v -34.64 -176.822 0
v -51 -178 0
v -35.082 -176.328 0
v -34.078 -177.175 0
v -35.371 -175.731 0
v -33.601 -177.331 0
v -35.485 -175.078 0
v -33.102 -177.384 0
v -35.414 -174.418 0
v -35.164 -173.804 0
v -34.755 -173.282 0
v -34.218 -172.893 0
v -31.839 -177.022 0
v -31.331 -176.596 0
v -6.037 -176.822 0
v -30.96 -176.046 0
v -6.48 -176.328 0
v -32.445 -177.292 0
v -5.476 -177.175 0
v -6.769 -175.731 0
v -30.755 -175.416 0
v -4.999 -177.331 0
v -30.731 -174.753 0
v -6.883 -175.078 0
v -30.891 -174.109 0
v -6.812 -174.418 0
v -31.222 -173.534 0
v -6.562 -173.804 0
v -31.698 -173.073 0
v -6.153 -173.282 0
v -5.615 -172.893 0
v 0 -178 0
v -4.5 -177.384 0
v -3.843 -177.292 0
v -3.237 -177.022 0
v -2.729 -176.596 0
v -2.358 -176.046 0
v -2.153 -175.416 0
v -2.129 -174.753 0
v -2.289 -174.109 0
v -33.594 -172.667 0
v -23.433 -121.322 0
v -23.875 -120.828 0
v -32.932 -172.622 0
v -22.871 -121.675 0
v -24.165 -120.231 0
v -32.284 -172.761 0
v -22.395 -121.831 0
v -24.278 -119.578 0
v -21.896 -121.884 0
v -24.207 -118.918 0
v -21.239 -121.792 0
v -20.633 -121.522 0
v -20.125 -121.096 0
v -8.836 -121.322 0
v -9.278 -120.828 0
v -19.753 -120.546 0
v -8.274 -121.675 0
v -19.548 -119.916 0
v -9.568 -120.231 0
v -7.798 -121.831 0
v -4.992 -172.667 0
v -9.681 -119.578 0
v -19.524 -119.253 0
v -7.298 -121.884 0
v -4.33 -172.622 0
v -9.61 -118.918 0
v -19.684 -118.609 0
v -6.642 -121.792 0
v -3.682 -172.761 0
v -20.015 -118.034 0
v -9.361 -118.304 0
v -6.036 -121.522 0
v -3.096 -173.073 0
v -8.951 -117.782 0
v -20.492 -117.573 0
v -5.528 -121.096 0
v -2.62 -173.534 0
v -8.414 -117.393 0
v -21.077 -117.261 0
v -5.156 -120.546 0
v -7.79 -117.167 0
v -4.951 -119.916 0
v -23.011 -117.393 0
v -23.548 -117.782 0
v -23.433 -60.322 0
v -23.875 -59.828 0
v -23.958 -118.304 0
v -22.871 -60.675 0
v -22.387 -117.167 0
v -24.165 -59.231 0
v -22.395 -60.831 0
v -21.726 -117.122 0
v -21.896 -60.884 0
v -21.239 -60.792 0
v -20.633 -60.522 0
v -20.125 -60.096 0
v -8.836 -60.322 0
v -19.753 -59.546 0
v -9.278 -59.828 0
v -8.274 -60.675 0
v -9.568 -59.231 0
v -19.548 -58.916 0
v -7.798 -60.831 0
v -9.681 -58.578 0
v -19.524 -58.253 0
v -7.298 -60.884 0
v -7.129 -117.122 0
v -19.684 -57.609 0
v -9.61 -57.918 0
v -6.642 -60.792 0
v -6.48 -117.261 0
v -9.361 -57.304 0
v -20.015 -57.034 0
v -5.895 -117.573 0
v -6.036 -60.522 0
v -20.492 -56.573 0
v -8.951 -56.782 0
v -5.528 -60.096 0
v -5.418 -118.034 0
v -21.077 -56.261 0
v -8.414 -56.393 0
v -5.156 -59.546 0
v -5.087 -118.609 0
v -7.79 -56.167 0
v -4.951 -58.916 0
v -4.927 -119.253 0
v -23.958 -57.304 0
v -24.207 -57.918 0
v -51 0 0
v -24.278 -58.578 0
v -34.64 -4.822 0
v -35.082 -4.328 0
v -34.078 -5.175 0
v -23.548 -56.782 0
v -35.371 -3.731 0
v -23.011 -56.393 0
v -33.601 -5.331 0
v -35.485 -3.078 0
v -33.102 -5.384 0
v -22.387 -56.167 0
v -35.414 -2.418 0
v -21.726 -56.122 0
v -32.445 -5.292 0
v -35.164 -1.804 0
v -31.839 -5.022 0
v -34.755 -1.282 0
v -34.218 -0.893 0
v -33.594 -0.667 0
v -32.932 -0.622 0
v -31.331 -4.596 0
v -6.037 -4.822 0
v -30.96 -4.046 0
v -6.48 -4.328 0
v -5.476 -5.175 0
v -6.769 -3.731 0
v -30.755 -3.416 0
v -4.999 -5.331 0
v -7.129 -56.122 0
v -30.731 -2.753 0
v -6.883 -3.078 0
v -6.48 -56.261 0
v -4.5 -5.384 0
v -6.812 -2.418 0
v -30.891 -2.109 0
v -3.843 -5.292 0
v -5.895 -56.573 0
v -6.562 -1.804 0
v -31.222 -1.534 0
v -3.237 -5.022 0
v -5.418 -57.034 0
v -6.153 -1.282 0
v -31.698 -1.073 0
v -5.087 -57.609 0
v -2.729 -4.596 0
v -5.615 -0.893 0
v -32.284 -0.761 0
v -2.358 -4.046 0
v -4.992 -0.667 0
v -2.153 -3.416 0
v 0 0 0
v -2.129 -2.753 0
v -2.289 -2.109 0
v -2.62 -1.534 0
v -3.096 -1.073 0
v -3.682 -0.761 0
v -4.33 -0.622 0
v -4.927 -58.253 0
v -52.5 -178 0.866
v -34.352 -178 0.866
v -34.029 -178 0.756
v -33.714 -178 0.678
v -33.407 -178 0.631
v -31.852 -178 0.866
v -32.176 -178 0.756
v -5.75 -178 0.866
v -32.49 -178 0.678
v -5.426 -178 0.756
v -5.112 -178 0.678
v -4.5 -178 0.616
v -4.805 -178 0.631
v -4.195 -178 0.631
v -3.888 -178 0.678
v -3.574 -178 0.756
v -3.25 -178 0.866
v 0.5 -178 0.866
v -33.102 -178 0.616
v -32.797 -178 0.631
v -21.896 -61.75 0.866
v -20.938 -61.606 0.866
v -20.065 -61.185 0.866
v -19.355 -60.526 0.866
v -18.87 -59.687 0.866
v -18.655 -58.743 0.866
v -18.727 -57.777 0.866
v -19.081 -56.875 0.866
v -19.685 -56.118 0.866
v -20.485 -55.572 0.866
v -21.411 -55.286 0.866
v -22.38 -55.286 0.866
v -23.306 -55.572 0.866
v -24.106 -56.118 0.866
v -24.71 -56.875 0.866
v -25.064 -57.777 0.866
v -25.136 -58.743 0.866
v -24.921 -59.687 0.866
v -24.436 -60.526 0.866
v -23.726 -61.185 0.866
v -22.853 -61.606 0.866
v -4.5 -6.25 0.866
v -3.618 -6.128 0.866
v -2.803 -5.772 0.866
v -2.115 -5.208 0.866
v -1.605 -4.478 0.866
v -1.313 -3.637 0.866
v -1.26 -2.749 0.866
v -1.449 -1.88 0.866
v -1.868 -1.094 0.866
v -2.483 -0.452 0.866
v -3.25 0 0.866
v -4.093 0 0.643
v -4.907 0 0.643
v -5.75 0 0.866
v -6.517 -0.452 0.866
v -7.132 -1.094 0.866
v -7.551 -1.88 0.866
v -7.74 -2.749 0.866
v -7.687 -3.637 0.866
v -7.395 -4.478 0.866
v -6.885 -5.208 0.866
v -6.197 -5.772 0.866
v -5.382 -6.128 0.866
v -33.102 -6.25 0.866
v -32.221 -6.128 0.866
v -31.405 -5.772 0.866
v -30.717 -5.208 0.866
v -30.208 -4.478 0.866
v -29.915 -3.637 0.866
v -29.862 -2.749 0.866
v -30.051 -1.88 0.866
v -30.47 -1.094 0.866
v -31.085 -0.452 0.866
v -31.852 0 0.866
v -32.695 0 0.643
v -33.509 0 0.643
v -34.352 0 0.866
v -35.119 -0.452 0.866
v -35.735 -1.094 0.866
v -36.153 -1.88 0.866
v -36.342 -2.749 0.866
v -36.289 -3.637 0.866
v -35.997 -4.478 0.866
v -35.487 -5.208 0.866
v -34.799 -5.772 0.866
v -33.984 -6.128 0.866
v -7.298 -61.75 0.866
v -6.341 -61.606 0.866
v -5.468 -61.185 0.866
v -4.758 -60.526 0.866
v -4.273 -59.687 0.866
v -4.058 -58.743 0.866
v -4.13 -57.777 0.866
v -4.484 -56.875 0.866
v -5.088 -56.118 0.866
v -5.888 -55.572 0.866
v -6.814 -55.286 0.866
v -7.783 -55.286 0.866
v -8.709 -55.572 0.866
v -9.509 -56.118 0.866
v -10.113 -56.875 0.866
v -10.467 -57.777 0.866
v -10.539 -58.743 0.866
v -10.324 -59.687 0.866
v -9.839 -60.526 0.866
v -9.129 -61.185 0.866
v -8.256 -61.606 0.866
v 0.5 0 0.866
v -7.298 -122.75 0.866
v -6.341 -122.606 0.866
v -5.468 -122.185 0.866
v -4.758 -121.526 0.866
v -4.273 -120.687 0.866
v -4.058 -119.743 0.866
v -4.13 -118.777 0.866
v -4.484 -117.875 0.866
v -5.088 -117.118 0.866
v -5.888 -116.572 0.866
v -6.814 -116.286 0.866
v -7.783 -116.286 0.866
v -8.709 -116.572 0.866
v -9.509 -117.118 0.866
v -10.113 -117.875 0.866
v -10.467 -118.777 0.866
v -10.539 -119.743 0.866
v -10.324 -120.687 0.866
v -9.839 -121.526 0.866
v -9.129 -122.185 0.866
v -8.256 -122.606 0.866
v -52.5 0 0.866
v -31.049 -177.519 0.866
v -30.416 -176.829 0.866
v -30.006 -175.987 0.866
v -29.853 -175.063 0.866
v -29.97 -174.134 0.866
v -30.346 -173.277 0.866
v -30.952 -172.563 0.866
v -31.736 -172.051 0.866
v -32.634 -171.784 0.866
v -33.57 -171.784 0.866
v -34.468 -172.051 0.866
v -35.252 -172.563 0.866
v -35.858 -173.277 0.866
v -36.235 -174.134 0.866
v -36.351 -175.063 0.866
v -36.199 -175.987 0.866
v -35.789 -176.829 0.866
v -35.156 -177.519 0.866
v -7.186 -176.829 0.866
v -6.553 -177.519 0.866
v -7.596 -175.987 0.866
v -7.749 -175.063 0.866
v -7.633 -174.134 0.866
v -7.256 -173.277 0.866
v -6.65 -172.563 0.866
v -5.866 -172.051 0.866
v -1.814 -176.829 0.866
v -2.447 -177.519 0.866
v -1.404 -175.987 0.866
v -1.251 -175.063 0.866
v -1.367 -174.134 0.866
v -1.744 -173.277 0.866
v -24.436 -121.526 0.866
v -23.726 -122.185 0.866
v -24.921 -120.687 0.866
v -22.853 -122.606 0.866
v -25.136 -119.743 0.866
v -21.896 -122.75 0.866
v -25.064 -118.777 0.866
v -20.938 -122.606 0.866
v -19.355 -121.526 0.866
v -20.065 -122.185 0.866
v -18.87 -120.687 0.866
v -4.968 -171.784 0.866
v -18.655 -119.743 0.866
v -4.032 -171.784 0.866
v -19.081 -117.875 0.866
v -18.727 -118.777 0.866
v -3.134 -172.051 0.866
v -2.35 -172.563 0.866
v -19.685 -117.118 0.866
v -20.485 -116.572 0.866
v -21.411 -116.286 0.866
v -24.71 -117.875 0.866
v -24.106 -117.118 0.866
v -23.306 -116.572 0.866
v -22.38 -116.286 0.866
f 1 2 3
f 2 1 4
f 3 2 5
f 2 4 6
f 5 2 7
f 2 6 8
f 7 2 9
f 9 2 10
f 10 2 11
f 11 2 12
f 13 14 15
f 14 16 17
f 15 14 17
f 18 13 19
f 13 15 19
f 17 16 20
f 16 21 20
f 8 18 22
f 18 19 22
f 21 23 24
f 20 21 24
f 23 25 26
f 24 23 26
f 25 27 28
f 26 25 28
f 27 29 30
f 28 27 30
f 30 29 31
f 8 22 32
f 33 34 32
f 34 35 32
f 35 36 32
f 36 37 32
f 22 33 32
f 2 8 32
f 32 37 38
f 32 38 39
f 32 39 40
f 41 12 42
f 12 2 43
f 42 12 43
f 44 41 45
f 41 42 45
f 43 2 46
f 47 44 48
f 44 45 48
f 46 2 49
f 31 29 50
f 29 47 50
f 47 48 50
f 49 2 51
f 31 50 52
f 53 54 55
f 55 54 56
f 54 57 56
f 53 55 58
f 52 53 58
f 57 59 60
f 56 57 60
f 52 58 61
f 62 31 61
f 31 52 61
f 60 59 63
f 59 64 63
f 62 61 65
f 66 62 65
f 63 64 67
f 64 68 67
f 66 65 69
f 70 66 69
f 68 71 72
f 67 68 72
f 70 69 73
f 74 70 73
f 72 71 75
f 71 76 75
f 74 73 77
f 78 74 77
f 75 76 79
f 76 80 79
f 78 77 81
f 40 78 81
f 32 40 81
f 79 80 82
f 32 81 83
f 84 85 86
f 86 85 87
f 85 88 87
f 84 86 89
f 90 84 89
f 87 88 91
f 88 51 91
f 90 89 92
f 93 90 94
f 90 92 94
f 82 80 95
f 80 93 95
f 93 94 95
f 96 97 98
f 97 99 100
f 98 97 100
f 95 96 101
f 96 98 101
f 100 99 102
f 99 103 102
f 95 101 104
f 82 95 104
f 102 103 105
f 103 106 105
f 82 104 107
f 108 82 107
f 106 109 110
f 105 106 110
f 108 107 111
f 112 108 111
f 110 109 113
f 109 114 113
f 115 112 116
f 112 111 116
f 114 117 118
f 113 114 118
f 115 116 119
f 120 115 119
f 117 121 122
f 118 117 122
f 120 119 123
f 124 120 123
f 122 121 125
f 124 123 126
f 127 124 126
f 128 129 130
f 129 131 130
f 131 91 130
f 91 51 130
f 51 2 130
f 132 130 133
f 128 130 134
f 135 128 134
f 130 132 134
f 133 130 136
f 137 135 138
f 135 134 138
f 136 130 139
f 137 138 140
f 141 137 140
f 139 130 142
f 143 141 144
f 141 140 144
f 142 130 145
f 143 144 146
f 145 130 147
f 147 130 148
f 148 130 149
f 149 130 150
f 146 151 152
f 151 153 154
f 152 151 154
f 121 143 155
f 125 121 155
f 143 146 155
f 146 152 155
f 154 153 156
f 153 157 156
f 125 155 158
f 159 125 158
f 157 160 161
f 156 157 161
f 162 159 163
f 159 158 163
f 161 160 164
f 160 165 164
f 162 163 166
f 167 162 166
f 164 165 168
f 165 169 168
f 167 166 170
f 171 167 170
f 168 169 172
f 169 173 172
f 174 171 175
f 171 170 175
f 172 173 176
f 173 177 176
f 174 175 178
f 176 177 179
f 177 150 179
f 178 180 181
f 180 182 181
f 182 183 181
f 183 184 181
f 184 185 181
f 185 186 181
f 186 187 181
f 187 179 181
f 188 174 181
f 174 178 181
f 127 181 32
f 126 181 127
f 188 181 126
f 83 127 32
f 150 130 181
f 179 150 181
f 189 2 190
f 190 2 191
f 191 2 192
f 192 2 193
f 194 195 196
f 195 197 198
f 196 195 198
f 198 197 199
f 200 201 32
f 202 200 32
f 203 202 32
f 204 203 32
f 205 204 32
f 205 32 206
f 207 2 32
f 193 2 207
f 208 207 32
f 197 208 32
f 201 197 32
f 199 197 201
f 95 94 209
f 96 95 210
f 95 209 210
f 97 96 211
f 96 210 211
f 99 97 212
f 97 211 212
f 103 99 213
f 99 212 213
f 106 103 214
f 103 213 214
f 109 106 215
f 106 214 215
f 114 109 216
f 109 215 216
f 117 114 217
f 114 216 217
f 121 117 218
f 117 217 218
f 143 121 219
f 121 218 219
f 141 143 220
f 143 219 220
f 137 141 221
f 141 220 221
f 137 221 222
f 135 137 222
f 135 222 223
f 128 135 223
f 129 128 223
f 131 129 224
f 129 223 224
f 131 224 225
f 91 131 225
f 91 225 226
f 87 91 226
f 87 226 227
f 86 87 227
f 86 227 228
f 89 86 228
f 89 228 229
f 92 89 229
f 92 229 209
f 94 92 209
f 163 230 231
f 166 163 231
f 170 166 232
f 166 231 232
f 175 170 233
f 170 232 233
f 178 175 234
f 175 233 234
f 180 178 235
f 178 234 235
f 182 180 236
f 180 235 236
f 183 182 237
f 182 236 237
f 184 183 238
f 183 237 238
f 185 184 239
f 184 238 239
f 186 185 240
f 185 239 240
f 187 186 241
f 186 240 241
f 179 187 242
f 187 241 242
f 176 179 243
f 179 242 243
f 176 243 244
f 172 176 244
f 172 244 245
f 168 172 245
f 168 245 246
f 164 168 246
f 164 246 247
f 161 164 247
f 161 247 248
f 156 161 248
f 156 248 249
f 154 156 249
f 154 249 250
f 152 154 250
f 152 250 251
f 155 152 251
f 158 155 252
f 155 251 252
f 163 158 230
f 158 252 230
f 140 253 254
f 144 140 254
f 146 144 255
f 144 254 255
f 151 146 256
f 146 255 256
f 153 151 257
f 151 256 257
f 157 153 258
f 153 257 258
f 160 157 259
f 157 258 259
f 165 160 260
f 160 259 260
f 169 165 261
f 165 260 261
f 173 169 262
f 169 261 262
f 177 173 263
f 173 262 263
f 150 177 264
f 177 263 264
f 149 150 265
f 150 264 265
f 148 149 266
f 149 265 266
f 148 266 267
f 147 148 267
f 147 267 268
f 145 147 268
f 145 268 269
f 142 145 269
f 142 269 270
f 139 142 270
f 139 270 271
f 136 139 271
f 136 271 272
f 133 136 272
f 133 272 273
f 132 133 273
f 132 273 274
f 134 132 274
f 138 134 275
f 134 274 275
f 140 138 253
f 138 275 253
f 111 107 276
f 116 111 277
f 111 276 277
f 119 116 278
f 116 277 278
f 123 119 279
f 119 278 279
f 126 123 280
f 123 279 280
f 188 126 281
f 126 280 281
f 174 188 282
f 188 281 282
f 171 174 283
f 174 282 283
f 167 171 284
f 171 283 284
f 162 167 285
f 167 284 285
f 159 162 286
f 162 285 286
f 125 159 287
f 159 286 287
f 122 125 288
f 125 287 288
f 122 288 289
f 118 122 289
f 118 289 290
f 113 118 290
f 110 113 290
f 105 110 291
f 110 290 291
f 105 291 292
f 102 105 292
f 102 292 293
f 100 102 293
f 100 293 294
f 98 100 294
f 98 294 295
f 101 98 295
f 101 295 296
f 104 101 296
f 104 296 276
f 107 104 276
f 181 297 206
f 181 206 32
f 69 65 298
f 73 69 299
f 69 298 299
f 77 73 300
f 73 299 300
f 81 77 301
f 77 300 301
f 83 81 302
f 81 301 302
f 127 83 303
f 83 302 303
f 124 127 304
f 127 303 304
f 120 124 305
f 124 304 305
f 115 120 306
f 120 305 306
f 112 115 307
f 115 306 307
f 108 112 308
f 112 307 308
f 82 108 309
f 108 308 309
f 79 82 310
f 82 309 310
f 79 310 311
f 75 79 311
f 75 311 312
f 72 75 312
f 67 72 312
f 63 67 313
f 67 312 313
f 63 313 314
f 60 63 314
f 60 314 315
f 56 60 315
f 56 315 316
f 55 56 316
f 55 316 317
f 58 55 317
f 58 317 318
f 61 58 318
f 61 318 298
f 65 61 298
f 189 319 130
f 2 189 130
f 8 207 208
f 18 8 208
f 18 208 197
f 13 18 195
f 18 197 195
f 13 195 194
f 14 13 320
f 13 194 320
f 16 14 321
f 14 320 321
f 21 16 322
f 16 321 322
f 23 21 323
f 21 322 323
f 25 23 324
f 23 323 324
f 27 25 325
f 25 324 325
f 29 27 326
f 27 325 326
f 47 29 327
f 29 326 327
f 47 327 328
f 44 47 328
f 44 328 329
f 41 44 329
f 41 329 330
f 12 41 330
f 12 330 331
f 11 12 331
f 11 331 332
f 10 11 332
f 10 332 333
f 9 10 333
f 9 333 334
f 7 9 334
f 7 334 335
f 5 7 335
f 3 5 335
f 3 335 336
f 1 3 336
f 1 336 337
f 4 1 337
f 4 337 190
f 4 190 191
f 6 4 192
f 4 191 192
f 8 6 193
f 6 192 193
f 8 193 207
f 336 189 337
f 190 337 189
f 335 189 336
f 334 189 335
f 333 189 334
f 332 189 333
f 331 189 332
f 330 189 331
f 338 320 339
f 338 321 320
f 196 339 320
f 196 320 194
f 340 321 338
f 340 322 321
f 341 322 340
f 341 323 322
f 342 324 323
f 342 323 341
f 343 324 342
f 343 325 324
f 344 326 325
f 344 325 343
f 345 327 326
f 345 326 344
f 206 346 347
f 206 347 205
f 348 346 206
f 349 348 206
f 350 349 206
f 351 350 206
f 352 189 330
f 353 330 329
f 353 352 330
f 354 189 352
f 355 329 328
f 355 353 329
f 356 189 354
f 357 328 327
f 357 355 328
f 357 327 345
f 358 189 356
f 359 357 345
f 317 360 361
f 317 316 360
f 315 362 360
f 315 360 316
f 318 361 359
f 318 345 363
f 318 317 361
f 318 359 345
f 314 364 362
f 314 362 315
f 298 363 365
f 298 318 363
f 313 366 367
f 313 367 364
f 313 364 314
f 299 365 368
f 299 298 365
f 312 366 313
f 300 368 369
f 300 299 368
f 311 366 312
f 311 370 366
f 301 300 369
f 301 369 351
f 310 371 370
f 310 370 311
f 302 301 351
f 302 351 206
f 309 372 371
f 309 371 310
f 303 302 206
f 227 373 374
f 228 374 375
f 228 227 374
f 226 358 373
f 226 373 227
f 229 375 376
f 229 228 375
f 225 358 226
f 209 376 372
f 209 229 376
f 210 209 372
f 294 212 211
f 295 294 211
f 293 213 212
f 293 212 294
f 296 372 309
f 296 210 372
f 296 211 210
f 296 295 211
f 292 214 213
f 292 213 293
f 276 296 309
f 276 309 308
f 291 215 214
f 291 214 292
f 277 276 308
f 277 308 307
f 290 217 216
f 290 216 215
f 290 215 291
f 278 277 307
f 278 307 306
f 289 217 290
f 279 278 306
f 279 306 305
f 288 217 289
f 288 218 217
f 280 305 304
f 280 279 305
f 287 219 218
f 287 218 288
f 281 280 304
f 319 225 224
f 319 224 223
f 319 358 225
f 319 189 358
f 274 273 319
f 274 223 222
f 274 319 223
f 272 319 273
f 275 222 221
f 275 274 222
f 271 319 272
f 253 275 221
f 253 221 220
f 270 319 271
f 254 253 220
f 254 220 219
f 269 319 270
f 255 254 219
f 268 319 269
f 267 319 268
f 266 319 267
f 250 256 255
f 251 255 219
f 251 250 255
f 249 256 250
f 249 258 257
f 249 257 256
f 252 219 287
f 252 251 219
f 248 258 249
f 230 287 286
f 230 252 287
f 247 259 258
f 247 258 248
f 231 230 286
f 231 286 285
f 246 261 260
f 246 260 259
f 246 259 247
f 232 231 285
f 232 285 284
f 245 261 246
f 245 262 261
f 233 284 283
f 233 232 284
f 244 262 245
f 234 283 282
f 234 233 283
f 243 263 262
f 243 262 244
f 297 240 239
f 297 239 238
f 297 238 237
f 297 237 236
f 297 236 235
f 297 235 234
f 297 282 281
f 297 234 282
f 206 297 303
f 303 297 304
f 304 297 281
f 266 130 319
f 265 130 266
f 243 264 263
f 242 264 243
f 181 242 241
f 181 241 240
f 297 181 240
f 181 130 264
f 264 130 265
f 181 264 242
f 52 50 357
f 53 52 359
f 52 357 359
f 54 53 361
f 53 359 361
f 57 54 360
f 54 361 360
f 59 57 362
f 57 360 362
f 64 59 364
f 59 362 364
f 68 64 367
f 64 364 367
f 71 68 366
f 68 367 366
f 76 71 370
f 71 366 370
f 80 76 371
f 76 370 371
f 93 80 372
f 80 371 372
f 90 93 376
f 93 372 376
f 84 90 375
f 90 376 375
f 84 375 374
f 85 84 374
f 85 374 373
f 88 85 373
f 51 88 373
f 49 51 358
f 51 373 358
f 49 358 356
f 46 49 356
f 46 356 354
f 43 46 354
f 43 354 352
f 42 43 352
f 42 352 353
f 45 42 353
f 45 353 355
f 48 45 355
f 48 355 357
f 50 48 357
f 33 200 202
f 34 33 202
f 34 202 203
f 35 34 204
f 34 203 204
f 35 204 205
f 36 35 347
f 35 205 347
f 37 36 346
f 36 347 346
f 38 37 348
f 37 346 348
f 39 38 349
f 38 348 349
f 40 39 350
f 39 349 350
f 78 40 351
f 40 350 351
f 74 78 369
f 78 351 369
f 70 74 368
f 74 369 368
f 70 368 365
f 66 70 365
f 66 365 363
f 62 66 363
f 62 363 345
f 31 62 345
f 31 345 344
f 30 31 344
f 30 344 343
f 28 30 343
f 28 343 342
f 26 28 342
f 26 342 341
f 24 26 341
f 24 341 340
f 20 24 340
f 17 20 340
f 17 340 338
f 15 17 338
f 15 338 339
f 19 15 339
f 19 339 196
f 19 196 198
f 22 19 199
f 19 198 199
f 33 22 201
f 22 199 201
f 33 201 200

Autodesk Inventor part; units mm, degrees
ref_plane "YZ Plane" through (0, 0, 0) normal (1, 0, 0) x (0, 1, 0)
ref_plane "Work Plane1" through (14.6553, 0, -25.7817) normal (0, 1, 0) x (-0.8660254, 0, 0.5)
ref_plane "Work Plane2" through (-53.25, -178, -67.8971) normal (0, -1, 0) x (0.8660254, 0, -0.5)
ref_plane "Work Plane3" through (14.6553, 0, -25.7817) normal (0, 1, 0) x (-0.8660254, 0, 0.5)
ref_plane "Work Plane4" through (-55.7811, 0, -1.2811) normal (0, 1, 0) x (0.5, 0, 0.8660254)
sketch "Sketch4" plane through (-55.7811, 0, -1.2811) normal (0, 1, 0) x (0.5, 0, 0.8660254)
  line L0 (3.5, 3.5) -> (-1, 3.5) projected
  line L1 (-1, 3.5) -> (-1, -0.5) projected
  line L2 (-1, -0.5) -> (-4.5, -0.5) projected
  line L3 (-4.5, -0.5) -> (-4.5, -14.5) projected
  line L4 (-4.5, -14.5) -> (4.5, -0.5) projected
  line L5 (4.5, -0.5) -> (3.5, -0.5) projected
  line L6 (3.5, -0.5) -> (3.5, 3.5) projected
  line L7 (3.5, 3.5) -> (29, 47.6673) projected
  line L8 (29, 47.6673) -> (3.5, 3.5)
  line L9 (3.5, 1.7679) -> (30, 47.6673)
  line L10 (30, 47.6673) -> (29, 47.6673)
  point P0 (29, 47.6673)
  dimension "d10" = 1
ref_plane "Work Plane5" through (-46.3218, -178, -67.8971) normal (0, -1, 0) x (0.8660254, 0, -0.5)
extrude "Extrusion2" add sketch "Sketch4" against normal up to surface (178 mm away) contours L7 L10 L9 L6
sketch "Sketch5" plane through (-52.5, 0, 0.866) normal (0, 0, 1) x (1, 0, 0)
  circle A0 centre (30.6045, -58.5) radius 2.3 projected
  circle A1 centre (45.2015, -58.5) radius 2.3 projected
  circle A2 centre (30.6045, -119.5) radius 2.3 projected
  circle A3 centre (45.2015, -119.5) radius 2.3 projected
  circle A4 centre (48, -3) radius 2 projected
  circle A5 centre (19.3979, -3) radius 2 projected
  circle A6 centre (48, -175) radius 2 projected
  circle A7 centre (19.3979, -175) radius 2 projected
  point P0 (52.5, 0)
hole "Hole2" at (-7.2985, -58.5, 0.866) at (-21.8955, -58.5, 0.866) at (-7.2985, -119.5, 0.866) at (-21.8955, -119.5, 0.866) at (-4.5, -3, 0.866) at (-33.1021, -3, 0.866) at (-4.5, -175, 0.866) at (-33.1021, -175, 0.866) direction (0, 0, -1) diameter 3.6 end through all countersink diameter 6.5 countersink angle 90 clearance for "Countersunk Flat Head Screw ISO 2009/7046" size "M3" standard "ISO"
properties part number "frobt" material "Nylon 6/6"
